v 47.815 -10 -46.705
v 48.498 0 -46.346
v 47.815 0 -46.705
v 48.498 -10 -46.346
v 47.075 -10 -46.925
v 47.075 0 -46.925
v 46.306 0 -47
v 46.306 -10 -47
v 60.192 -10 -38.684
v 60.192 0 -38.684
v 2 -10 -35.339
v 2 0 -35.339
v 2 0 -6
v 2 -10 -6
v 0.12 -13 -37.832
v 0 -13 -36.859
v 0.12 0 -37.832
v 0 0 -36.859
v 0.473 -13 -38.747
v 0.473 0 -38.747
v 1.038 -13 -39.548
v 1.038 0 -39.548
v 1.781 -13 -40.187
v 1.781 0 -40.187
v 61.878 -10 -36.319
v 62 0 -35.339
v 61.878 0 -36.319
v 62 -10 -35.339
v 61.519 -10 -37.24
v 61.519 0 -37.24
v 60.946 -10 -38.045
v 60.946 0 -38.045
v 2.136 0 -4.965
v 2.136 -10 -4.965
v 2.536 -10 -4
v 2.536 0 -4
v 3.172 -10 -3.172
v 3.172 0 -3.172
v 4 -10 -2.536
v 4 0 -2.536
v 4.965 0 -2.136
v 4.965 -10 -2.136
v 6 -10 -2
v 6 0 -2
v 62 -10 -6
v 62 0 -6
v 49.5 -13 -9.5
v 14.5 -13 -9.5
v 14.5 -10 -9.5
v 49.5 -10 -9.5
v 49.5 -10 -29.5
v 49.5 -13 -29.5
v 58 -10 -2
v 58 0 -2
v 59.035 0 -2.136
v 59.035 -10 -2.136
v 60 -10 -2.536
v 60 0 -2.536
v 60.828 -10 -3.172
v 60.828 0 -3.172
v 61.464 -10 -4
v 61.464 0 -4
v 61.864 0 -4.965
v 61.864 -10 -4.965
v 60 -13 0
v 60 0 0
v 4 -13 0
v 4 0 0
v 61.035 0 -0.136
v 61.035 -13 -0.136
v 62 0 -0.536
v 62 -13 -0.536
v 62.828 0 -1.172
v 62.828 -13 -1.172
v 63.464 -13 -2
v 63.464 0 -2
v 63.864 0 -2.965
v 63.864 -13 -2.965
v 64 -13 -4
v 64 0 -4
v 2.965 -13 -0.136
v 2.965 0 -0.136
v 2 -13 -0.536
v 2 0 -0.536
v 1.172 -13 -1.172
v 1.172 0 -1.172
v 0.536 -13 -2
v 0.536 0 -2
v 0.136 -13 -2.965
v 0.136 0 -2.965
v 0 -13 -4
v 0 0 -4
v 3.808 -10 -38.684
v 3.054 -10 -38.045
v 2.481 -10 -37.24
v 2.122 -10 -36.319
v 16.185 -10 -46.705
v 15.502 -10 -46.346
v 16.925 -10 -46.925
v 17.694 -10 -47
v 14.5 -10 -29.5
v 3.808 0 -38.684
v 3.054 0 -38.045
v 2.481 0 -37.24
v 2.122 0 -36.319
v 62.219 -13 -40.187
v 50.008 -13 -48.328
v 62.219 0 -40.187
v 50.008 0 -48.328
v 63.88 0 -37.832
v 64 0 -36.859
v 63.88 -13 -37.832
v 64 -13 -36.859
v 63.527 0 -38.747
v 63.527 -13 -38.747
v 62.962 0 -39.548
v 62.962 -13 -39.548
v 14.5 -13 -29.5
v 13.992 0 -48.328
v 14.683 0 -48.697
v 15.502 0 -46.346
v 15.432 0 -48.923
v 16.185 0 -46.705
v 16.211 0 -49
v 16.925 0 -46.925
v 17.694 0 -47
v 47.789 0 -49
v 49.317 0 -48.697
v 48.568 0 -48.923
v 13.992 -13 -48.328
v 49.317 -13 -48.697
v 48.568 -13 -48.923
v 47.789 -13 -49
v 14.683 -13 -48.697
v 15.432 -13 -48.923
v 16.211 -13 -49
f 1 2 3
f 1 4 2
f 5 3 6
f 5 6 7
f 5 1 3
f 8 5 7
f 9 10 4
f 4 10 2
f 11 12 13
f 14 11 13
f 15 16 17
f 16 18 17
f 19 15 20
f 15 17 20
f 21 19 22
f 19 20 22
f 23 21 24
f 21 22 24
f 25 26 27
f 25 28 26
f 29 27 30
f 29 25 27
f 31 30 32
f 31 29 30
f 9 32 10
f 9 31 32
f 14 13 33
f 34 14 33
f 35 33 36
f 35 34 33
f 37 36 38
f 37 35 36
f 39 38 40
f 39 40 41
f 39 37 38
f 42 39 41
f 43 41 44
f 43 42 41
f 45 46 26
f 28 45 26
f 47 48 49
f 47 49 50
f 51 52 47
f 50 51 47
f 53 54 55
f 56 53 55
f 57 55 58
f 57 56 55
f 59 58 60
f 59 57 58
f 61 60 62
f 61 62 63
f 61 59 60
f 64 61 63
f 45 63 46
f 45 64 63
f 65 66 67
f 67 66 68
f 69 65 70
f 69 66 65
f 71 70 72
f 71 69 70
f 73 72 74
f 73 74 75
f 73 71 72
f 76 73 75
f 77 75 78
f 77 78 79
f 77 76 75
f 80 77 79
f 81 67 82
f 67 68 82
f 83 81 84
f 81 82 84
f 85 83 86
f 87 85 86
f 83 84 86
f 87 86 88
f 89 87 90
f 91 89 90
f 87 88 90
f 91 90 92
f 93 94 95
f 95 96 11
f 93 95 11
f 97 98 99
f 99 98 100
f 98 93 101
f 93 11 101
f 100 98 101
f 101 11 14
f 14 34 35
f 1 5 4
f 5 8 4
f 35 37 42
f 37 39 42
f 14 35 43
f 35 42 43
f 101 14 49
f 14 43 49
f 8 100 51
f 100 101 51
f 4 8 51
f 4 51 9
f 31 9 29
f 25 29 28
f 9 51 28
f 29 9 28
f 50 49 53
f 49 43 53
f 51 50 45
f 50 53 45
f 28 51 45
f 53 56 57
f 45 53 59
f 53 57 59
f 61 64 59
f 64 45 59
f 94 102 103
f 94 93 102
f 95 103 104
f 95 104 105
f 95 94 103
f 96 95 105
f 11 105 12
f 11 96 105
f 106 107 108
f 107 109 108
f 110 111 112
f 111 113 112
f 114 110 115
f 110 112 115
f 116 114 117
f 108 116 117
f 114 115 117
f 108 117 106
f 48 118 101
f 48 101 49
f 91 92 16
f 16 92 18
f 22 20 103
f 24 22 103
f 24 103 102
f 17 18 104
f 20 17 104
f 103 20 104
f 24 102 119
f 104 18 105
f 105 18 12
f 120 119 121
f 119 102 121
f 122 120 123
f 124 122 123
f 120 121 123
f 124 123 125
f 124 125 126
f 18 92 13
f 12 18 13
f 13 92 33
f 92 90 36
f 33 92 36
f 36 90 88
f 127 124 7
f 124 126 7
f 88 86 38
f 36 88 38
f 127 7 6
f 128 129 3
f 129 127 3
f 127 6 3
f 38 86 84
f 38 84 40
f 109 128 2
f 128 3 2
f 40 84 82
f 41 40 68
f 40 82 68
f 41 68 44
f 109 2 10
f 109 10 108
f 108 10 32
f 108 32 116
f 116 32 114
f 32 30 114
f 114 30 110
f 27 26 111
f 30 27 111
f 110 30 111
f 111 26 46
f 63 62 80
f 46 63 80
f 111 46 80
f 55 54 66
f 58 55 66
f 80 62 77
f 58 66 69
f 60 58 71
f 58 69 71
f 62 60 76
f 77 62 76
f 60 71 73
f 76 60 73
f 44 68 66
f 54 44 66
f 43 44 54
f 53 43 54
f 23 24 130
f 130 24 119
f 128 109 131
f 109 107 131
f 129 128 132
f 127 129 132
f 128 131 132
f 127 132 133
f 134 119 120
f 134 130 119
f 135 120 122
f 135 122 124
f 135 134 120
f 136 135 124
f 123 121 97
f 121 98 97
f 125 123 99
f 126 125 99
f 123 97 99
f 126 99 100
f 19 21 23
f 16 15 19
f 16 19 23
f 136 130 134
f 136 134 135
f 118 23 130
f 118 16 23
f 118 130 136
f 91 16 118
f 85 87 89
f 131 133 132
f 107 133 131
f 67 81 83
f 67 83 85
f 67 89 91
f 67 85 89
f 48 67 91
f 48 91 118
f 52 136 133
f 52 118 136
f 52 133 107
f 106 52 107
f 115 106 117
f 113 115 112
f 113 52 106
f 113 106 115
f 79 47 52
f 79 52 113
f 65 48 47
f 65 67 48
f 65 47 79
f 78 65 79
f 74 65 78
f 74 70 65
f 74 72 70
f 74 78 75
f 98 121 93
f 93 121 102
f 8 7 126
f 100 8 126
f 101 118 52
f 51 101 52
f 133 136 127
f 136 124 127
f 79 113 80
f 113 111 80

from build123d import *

# Parameters (mm, degrees)
F1_DEPTH = 10
F3_DEPTH = 3
F4_W     = 35
F4_H     = 20
F5_DEPTH = 25
F6_R     = 4
F7_R     = 4
F8_R     = 4


with BuildPart() as f1:
    # F0 (on Front) → F1 (new body)
    with BuildSketch(Plane.XZ):
        Polygon((64, 0), (0, 0), (0, -2), (0, -39), (15, -49), (32, -49), (49, -49), (64, -39), align=None)
        Polygon((2, -37.5), (2, -2), (62, -2), (62, -37.5), (47.5, -47), (32, -47), (16.5, -47), align=None, mode=Mode.SUBTRACT)
    extrude(amount=F1_DEPTH)

    # F2 (on face) → F3 (join)
    with BuildSketch(Plane.XZ.offset(10)):
        Polygon((0, -39), (15, -49), (49, -49), (64, -39), (64, 0), (0, 0), align=None)
    extrude(amount=F3_DEPTH)

    # F4 (on face) → F5 (cut)
    with BuildSketch(Plane.XZ.offset(13)):
        with Locations((32, -19.5)):
            Rectangle(F4_W, F4_H)
    extrude(amount=-F5_DEPTH, mode=Mode.SUBTRACT)

    # F6
    f6_edges = [f1.edges().sort_by_distance(p)[0] for p in [
        (64, -6.5, 0),
    ]]
    fillet(f6_edges, radius=F6_R)

    # F7
    f7_edges = [f1.edges().sort_by_distance(p)[0] for p in [
        (0, -6.5, 0),
        (64, -6.5, -39),
        (49, -6.5, -49),
        (15, -6.5, -49),
        (0, -6.5, -39),
    ]]
    fillet(f7_edges, radius=F7_R)

    # F8
    f8_edges = [f1.edges().sort_by_distance(p)[0] for p in [
        (2, -5, -2),
        (2, -5, -37.5),
        (62, -5, -2),
        (62, -5, -37.5),
        (47.5, -5, -47),
        (16.5, -5, -47),
    ]]
    fillet(f8_edges, radius=F8_R)


solid = f1.part
